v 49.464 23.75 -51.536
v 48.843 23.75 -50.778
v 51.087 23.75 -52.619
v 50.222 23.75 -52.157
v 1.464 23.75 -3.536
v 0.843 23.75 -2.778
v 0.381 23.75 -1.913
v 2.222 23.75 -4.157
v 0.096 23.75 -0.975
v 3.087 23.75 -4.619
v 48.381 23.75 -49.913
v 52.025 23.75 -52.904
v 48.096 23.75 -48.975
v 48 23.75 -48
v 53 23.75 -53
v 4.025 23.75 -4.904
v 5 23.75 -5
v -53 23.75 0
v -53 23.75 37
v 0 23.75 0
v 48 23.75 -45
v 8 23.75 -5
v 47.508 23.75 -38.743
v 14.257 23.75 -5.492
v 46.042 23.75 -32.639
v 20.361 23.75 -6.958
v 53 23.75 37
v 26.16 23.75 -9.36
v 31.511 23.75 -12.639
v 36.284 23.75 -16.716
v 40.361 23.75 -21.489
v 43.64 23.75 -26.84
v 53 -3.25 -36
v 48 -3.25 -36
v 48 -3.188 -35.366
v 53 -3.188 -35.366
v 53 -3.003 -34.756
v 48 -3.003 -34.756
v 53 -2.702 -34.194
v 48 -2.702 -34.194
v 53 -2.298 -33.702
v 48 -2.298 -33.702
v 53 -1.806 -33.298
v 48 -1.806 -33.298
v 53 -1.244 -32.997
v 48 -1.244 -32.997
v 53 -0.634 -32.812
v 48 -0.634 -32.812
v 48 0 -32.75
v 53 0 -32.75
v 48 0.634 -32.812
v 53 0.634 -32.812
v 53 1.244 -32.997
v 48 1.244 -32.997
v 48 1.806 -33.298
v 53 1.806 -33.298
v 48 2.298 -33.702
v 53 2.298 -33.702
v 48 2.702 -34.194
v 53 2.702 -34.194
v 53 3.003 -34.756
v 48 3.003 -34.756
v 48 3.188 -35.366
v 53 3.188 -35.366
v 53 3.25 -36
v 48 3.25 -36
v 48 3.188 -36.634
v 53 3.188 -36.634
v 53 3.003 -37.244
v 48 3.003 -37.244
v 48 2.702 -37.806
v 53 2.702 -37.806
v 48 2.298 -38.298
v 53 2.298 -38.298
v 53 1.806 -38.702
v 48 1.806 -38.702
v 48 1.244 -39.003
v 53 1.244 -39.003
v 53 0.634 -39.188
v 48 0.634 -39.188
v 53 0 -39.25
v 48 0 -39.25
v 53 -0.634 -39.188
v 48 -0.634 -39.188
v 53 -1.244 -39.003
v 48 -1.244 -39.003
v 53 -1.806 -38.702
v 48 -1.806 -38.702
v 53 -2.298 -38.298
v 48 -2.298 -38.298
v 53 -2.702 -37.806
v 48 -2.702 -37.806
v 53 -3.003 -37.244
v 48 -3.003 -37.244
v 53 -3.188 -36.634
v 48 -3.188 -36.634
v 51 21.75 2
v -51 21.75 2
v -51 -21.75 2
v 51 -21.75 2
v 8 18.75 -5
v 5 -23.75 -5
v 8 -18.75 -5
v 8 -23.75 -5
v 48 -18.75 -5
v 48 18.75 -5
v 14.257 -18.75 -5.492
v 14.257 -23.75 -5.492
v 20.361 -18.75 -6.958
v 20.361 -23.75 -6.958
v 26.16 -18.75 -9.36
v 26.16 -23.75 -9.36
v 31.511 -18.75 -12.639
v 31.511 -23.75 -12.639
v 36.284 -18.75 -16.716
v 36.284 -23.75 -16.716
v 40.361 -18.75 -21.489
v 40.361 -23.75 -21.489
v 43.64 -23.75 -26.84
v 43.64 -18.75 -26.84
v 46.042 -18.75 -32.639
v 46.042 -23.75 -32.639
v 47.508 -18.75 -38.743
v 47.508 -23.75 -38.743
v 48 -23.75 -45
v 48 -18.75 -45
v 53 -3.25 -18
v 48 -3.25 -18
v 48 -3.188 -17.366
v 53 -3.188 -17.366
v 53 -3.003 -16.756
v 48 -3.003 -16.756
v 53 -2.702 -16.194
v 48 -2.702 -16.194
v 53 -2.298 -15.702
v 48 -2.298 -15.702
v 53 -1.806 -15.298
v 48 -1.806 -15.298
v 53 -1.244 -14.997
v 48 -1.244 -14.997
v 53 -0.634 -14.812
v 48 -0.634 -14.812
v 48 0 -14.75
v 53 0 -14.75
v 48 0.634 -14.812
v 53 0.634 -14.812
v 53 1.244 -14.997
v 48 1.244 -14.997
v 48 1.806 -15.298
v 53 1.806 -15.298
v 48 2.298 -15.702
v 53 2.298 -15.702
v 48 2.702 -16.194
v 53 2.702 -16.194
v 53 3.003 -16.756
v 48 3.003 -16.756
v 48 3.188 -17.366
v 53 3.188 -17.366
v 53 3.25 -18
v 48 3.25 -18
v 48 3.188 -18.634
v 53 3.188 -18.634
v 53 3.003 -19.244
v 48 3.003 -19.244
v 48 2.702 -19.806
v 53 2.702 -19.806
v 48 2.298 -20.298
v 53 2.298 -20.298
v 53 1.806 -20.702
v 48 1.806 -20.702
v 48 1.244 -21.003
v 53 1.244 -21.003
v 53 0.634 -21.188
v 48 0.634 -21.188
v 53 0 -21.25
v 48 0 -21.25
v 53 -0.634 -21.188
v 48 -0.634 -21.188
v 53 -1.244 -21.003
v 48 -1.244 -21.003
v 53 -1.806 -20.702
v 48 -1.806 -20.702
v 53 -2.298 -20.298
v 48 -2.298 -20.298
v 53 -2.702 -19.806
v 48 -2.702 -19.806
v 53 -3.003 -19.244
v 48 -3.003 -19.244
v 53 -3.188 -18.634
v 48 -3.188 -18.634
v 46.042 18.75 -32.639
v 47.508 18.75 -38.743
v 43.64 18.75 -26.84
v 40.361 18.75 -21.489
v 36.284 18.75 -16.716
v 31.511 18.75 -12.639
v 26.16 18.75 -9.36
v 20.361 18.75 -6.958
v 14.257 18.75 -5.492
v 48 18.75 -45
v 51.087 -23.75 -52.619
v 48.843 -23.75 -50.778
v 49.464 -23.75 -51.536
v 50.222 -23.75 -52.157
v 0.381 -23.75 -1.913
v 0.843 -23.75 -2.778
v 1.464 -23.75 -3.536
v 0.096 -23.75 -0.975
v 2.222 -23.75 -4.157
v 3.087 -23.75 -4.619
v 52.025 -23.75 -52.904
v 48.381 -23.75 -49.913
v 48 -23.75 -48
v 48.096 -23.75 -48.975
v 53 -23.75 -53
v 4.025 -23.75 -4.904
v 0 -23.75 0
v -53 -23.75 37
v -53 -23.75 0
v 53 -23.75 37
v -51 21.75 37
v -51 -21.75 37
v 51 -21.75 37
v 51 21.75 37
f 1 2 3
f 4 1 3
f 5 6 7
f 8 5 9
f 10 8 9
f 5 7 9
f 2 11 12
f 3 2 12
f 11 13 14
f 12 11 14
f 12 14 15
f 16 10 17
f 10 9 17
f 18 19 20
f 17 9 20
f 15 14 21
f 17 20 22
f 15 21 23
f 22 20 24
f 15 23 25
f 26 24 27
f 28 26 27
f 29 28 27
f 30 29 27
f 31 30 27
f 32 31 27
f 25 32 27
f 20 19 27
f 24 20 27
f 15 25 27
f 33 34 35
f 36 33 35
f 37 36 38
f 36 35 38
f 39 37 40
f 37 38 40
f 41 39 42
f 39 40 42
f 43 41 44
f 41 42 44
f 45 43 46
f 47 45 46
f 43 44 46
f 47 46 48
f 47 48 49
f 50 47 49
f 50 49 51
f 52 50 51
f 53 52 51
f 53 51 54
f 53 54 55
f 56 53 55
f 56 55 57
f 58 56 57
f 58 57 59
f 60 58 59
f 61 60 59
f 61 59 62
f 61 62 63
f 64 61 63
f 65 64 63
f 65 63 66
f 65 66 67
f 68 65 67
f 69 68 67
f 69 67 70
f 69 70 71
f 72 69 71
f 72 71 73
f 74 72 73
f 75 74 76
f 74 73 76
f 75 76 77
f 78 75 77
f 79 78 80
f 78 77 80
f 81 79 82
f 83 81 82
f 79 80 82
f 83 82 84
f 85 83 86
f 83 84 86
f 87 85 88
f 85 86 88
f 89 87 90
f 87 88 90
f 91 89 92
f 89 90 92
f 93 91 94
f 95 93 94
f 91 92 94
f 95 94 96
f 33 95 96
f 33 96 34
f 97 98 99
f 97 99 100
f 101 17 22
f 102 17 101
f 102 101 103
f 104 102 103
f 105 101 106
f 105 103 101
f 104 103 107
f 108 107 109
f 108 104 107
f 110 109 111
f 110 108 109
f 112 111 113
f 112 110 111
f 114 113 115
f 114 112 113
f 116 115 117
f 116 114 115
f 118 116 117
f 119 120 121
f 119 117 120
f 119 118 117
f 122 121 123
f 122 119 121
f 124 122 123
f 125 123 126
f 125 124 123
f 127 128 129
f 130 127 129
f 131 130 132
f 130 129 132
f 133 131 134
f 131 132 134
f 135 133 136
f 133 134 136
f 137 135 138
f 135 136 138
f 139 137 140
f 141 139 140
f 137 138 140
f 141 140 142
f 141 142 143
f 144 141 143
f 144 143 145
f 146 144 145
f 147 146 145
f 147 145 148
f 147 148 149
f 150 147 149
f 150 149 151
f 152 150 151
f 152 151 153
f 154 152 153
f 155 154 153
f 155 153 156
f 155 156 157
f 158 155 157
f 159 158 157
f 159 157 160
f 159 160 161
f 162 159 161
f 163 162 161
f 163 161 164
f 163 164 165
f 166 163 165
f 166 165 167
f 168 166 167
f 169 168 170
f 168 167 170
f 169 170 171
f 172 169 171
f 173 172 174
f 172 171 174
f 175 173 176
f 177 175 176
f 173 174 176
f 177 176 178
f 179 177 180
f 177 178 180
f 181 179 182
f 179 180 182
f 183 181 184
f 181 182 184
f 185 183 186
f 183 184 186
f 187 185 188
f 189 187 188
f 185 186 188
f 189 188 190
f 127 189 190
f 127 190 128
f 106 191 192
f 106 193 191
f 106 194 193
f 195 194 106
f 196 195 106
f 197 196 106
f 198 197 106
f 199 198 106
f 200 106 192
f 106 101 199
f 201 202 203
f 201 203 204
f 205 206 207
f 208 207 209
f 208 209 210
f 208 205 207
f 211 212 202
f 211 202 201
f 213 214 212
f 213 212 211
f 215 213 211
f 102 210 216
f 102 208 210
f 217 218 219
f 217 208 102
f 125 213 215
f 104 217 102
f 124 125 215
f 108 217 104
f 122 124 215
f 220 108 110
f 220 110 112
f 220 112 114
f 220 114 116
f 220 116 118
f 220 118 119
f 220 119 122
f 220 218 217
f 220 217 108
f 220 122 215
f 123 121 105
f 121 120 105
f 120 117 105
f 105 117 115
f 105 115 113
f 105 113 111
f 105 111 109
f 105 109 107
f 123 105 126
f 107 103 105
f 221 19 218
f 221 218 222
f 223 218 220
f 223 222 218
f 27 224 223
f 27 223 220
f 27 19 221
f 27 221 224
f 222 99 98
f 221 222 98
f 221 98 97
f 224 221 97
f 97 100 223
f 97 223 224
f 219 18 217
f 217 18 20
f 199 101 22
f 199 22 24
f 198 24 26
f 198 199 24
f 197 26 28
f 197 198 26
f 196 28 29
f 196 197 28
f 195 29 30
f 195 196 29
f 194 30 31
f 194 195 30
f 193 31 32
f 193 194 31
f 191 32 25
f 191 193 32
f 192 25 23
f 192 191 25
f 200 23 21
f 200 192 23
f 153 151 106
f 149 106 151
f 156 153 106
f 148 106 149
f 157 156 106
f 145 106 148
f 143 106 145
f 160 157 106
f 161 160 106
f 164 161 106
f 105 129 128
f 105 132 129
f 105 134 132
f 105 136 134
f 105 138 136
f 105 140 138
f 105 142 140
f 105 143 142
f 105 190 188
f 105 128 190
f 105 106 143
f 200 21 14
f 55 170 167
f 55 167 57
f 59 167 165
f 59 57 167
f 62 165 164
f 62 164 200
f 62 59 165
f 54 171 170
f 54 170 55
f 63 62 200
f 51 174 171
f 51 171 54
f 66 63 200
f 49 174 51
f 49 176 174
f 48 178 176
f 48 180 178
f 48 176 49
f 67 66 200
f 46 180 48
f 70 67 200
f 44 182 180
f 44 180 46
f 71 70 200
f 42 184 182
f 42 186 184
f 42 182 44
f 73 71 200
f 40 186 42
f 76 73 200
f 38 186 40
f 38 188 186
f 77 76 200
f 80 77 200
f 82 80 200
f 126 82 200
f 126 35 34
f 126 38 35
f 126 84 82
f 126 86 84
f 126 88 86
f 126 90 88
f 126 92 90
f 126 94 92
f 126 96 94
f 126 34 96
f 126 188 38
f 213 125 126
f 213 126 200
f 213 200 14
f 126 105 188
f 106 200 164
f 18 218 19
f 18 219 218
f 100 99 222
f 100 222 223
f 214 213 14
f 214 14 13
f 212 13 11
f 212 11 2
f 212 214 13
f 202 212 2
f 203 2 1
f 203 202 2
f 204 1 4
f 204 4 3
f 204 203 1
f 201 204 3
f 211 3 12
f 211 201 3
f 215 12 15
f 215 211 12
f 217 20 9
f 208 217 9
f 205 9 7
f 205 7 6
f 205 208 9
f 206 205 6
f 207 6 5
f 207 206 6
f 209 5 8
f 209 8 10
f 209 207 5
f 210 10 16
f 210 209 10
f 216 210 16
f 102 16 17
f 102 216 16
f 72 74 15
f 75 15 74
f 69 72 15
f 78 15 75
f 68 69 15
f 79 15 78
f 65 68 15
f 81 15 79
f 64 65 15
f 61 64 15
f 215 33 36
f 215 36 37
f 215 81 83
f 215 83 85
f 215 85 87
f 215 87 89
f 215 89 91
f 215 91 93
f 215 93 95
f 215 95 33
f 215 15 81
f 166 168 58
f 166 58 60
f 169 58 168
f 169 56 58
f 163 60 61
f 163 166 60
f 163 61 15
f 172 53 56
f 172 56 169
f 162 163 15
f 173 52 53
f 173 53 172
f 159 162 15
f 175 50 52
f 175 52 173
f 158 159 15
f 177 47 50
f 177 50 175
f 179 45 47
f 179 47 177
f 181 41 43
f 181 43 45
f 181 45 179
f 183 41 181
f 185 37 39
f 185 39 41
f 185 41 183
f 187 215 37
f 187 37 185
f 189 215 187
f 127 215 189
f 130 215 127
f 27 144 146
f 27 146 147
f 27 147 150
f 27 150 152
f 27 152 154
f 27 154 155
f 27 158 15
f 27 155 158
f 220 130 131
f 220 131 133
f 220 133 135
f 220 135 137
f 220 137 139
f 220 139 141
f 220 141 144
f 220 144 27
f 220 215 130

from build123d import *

# Parameters (mm, degrees)
F0_W     = 106
F0_H     = 47.5
F0_W_2   = 102
F0_H_2   = 43.5
F1_DEPTH = 2
F2_W     = 106
F2_H     = 47.5
F2_W_2   = 102
F2_H_2   = 43.5
F3_DEPTH = 35
F5_DEPTH = 47.5
F6_W     = 37.5
F6_H     = 48
F7_DEPTH = 101
F8_R     = 3.25
F9_DEPTH = 25


with BuildPart() as f1:
    # F0 (on Top) → F1 (new body)
    with BuildSketch(Plane.XY):
        Rectangle(F0_W, F0_H)
        Rectangle(F0_W_2, F0_H_2, mode=Mode.SUBTRACT)
        Rectangle(F0_W_2, F0_H_2)
    extrude(amount=F1_DEPTH)

    # F2 (on face) → F3 (join)
    with BuildSketch(Plane.XY.offset(2)):
        Rectangle(F2_W, F2_H)
        Rectangle(F2_W_2, F2_H_2, mode=Mode.SUBTRACT)
    extrude(amount=F3_DEPTH)

    # F4 (on face) → F5 (join)
    with BuildSketch(Plane.XZ.offset(23.75)):
        with BuildLine():
            Line((53, -5), (53, 0))
            Line((53, 0), (0, 0))
            ThreePointArc((0, 0), (1.464466, -3.535534), (5, -5))
            Line((5, -5), (8, -5))
            ThreePointArc((8, -5), (36.284271, -16.715729), (48, -45))
            Line((48, -45), (48, -48))
            ThreePointArc((48, -48), (49.464466, -51.535534), (53, -53))
            Line((53, -53), (53, -5))
        make_face()
    extrude(amount=-F5_DEPTH)

    # F6 (on face) → F7 (cut)
    with BuildSketch(Plane(origin=(-53, 0, 0), x_dir=(0, -1, 0), z_dir=(-1, 0, 0))):
        with Locations((0, -29)):
            Rectangle(F6_W, F6_H)
    extrude(amount=-F7_DEPTH, mode=Mode.SUBTRACT)

    # F8 (on face) → F9 (cut)
    with BuildSketch(Plane(origin=(48, 0, 0), x_dir=(0, -1, 0), z_dir=(-1, 0, 0))):
        with Locations((0, -18)):
            Circle(F8_R)
        with Locations((0, -36)):
            Circle(F8_R)
    extrude(amount=-F9_DEPTH, mode=Mode.SUBTRACT)


solid = f1.part
